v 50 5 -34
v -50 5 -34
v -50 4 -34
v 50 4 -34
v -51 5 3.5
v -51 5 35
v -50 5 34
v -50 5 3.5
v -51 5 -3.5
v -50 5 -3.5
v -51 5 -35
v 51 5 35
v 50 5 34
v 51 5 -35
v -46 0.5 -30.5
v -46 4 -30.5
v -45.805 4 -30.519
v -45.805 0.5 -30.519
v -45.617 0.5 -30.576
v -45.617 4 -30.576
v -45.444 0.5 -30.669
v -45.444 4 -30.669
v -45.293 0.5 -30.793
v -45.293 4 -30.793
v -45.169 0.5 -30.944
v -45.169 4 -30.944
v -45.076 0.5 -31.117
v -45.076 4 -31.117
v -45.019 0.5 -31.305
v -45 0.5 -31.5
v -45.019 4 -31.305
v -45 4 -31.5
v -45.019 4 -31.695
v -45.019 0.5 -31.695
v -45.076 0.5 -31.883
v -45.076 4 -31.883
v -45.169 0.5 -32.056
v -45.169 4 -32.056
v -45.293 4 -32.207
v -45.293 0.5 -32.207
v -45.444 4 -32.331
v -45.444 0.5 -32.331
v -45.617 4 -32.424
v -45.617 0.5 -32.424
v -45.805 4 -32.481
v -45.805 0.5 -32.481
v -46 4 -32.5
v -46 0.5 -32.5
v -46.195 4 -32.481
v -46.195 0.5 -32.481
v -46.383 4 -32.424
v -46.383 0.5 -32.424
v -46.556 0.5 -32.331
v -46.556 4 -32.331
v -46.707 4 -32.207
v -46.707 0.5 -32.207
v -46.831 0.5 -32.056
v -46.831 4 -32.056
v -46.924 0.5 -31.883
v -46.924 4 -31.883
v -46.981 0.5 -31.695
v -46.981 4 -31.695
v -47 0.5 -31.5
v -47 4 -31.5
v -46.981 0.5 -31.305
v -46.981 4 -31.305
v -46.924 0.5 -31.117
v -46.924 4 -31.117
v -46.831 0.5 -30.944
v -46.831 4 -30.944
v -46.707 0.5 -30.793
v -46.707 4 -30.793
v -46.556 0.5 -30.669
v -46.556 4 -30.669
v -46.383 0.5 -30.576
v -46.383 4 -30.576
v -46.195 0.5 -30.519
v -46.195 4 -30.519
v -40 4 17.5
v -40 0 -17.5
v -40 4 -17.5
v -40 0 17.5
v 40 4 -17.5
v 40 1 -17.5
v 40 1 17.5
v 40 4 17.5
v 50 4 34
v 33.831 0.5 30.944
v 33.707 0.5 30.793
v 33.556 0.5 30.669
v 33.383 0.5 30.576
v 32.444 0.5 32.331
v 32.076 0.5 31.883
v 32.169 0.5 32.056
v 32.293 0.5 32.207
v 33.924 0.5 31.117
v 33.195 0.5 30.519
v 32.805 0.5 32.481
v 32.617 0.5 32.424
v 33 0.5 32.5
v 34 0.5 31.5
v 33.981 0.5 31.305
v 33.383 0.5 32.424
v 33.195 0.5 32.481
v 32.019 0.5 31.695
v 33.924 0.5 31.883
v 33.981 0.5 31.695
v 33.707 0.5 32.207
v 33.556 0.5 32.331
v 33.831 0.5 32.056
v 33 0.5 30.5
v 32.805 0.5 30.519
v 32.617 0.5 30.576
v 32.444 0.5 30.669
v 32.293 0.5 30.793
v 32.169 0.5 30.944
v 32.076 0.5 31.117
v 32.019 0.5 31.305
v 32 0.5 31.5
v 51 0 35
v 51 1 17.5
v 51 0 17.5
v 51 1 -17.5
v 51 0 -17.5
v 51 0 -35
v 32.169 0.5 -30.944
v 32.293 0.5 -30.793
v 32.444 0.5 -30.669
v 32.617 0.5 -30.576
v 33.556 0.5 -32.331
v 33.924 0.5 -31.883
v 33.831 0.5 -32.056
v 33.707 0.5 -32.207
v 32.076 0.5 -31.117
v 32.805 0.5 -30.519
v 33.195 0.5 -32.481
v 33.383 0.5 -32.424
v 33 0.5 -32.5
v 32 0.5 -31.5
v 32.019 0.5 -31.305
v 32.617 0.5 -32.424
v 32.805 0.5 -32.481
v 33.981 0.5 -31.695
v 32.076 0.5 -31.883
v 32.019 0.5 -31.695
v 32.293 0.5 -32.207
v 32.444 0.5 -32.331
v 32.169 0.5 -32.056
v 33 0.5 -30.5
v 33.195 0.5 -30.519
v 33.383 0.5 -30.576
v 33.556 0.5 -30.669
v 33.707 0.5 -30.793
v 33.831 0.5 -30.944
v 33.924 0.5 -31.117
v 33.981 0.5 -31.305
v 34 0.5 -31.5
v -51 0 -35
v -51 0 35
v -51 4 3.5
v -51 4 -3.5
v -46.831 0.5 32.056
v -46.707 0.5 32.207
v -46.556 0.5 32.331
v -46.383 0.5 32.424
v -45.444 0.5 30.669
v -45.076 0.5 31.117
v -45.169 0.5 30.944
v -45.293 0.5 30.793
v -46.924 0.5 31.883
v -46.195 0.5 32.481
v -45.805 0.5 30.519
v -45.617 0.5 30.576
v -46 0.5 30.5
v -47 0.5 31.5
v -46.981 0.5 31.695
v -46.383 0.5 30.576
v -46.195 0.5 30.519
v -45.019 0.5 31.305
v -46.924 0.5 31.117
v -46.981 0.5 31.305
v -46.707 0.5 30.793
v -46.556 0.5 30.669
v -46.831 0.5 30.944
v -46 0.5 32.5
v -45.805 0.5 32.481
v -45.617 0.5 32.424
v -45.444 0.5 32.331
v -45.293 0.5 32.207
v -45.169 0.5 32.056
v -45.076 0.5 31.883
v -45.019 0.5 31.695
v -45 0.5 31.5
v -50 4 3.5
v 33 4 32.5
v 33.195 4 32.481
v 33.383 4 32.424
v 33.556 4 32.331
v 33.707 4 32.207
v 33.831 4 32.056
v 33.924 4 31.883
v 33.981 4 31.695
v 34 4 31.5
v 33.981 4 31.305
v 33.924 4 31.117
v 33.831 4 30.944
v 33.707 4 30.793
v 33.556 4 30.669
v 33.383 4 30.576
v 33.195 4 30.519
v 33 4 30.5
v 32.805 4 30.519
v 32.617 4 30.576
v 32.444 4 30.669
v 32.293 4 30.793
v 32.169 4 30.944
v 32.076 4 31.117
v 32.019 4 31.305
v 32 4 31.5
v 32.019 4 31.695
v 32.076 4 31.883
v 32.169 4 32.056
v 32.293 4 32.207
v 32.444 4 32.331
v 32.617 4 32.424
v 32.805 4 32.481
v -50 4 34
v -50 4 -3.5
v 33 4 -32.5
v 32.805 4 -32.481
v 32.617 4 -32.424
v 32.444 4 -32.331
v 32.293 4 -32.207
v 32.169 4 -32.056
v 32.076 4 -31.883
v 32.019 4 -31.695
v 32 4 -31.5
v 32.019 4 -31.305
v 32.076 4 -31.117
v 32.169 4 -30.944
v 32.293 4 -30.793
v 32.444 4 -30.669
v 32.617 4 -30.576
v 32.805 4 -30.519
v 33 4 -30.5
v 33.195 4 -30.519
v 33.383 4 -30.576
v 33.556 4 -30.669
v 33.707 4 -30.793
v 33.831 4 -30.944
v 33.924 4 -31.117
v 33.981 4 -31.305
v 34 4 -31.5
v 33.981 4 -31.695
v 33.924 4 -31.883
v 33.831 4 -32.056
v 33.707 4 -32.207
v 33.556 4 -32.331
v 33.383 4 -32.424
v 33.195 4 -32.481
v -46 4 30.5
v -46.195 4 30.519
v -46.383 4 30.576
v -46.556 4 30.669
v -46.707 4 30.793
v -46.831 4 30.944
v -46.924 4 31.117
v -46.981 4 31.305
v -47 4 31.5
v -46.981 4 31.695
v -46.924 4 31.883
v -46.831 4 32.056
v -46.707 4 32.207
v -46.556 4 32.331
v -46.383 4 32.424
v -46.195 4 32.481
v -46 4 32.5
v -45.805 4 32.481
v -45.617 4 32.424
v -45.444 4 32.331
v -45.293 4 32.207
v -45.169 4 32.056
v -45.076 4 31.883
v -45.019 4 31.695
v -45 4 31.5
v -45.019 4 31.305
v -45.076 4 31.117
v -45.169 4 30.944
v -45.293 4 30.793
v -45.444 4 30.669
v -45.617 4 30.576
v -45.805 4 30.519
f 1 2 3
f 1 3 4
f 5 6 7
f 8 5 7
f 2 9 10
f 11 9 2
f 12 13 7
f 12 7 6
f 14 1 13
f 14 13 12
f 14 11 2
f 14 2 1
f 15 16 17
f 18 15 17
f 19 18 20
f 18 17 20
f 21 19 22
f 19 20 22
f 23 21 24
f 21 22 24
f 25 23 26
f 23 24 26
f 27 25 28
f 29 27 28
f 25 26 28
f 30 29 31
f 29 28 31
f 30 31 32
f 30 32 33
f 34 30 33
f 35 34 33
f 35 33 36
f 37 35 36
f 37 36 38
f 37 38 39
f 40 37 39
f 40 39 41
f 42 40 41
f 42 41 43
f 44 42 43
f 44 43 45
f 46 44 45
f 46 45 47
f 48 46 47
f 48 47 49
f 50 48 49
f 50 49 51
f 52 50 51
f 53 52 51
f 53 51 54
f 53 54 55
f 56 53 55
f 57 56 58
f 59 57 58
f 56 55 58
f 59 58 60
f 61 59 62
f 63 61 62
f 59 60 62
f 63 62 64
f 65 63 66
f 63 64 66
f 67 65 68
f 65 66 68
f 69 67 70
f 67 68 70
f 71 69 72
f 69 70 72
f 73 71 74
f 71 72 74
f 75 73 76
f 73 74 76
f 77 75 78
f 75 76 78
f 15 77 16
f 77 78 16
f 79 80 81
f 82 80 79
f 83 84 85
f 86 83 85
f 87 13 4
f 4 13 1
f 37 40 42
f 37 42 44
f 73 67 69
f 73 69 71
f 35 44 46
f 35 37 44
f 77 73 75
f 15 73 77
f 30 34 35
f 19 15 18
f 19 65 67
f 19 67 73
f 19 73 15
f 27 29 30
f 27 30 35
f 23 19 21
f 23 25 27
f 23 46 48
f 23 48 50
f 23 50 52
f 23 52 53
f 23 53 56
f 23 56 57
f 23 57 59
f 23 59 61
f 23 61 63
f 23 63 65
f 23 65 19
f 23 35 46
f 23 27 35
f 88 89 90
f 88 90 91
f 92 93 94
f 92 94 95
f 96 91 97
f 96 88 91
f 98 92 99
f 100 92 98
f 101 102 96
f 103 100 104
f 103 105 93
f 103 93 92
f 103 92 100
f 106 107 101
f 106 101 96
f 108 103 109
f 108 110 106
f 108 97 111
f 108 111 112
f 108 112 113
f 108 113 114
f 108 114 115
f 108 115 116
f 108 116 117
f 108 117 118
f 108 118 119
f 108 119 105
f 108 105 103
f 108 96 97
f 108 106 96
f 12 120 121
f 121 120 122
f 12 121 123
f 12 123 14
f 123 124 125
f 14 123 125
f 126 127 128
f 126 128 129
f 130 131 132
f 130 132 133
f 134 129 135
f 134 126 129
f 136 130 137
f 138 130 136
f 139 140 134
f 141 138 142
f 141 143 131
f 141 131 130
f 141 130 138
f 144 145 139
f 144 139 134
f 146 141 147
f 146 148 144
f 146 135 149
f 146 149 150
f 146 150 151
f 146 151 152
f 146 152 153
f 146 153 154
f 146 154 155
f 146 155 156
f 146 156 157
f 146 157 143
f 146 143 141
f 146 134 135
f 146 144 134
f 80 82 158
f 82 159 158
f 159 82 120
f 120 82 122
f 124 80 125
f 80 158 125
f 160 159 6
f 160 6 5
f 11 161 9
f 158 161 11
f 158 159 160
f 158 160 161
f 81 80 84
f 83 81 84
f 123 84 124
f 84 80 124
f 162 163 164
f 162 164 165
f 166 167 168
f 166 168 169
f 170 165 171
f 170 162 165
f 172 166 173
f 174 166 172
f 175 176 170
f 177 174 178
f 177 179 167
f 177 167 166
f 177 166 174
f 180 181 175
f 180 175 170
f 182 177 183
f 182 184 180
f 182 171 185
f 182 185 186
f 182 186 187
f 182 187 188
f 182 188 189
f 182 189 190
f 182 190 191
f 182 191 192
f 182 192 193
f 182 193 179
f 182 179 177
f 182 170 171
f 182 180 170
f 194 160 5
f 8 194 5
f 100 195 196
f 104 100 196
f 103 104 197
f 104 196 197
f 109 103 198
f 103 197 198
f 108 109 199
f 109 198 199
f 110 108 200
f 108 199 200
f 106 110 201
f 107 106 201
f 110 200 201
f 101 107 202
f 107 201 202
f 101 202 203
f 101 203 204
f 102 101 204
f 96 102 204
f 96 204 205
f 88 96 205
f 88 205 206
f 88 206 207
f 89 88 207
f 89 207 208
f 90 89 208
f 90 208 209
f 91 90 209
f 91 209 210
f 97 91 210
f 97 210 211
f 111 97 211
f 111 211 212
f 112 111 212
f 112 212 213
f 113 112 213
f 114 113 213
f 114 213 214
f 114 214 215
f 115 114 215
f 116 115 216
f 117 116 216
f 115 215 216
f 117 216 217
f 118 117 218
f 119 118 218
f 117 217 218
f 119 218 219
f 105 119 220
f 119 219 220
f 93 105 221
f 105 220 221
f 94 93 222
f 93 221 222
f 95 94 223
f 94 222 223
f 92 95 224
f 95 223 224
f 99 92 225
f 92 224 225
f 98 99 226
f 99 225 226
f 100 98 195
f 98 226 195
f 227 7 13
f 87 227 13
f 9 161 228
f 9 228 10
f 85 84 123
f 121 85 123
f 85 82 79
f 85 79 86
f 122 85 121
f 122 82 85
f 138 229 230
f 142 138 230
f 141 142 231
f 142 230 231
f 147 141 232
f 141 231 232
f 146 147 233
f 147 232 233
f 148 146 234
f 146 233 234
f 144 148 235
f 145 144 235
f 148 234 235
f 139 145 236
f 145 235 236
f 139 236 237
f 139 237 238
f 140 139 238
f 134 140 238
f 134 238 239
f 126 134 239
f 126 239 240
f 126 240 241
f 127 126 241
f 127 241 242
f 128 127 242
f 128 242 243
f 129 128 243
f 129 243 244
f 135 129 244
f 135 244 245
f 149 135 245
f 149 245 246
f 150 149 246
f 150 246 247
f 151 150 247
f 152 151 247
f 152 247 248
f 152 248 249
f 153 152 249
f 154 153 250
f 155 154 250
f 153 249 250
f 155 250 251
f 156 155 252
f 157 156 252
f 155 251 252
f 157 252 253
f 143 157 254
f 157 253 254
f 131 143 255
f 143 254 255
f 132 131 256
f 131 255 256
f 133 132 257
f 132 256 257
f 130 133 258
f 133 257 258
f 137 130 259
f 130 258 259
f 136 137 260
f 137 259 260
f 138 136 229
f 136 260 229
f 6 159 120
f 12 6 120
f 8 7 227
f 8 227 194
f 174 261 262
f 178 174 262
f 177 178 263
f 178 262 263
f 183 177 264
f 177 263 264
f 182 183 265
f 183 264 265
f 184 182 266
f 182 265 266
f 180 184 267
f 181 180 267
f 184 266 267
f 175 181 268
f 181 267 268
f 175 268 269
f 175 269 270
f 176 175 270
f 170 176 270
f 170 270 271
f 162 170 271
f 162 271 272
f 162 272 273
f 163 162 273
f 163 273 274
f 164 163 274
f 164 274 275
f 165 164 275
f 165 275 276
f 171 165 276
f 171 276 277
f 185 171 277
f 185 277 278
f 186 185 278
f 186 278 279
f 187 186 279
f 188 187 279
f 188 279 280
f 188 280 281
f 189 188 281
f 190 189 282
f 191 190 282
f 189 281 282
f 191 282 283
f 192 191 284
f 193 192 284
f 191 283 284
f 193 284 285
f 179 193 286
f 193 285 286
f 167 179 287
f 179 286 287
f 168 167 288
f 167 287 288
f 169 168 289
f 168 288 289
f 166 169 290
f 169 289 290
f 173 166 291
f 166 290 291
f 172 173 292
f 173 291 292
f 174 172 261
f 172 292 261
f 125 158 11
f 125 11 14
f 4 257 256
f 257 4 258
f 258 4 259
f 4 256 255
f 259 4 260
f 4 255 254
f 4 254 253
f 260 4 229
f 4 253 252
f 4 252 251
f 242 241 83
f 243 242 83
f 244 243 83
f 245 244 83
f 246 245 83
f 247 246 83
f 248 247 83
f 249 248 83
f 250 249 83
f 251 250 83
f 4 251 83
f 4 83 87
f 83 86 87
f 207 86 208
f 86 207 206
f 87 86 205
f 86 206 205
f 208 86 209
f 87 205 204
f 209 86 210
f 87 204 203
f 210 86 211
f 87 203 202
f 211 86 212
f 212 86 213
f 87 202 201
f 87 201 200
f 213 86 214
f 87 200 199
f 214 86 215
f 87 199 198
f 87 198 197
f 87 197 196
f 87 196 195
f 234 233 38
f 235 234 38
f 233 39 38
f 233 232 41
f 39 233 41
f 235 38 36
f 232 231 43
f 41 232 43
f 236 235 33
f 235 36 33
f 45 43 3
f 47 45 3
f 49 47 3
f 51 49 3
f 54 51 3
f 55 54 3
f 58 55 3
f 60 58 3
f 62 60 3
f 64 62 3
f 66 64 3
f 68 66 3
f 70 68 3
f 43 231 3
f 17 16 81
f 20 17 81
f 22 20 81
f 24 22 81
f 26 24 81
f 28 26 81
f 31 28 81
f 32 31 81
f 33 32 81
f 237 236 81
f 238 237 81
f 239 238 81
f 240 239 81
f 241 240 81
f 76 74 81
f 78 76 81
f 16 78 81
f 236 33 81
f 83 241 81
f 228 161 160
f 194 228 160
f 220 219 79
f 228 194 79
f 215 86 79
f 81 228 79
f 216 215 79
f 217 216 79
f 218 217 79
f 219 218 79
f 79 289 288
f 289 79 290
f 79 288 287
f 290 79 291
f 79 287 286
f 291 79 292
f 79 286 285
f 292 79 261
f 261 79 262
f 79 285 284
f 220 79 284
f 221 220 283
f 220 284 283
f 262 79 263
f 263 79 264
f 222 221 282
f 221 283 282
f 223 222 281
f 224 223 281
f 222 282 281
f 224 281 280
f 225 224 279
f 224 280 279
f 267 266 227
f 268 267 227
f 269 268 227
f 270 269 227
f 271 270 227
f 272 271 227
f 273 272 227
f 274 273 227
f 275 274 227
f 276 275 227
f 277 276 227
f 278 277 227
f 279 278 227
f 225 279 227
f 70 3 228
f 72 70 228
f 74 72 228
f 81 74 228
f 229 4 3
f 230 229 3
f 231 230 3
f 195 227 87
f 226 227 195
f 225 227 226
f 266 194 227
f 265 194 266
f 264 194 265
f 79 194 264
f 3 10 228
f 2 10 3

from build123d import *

# Parameters (mm, degrees)
SKETCH_1_W          = 102
SKETCH_1_H          = 70
EXTRUDE_1_DEPTH     = 5
SKETCH_2_R          = 1
CUT_EXTRUDE_1_DEPTH = 4.5
SKETCH_3_W          = 7
SKETCH_3_H          = 1
CUT_EXTRUDE_2_DEPTH = 2
SKETCH_4_W          = 80
SKETCH_4_H          = 35
CUT_EXTRUDE_3_DEPTH = 5
SKETCH_5_W          = 11
SKETCH_5_H          = 35
CUT_EXTRUDE_4_DEPTH = 1
SKETCH_6_W          = 100
SKETCH_6_H          = 68
CUT_EXTRUDE_5_DEPTH = 1


with BuildPart() as part:
    # Эскиз1 → Бобышка-Вытянуть1 (new body)
    with BuildSketch(Plane(origin=(0, 0, 0), x_dir=(1, 0, 0), z_dir=(0, 1, 0))):
        Rectangle(SKETCH_1_W, SKETCH_1_H)
    extrude(amount=EXTRUDE_1_DEPTH)

    # Эскиз2 → Вырез-Вытянуть1 (cut)
    with BuildSketch(Plane(origin=(0, 5, 0), x_dir=(1, 0, 0), z_dir=(0, 1, 0))):
        with Locations(Location((-46, 31.5, 0), (0, 0, 270))):
            Circle(SKETCH_2_R)
        with Locations(Location((33, 31.5, 0), (0, 0, 90))):
            Circle(SKETCH_2_R)
        with Locations(Location((33, -31.5, 0), (0, 0, 270))):
            Circle(SKETCH_2_R)
        with Locations(Location((-46, -31.5, 0), (0, 0, 90))):
            Circle(SKETCH_2_R)
    extrude(amount=-CUT_EXTRUDE_1_DEPTH, mode=Mode.SUBTRACT)

    # Эскиз3 → Вырез-Вытянуть2 (cut)
    with BuildSketch(Plane.ZY.offset(51)):
        with Locations((0, 4.5)):
            Rectangle(SKETCH_3_W, SKETCH_3_H)
    extrude(amount=-CUT_EXTRUDE_2_DEPTH, mode=Mode.SUBTRACT)

    # Эскиз4 → Вырез-Вытянуть3 (cut)
    with BuildSketch(Plane.XZ):
        Rectangle(SKETCH_4_W, SKETCH_4_H)
    extrude(amount=-CUT_EXTRUDE_3_DEPTH, mode=Mode.SUBTRACT)

    # Эскиз5 → Вырез-Вытянуть4 (cut)
    with BuildSketch(Plane.XZ):
        with Locations((45.5, 0)):
            Rectangle(SKETCH_5_W, SKETCH_5_H)
    extrude(amount=-CUT_EXTRUDE_4_DEPTH, mode=Mode.SUBTRACT)

    # Эскиз6 → Вырез-Вытянуть5 (cut)
    with BuildSketch(Plane(origin=(0, 5, 0), x_dir=(1, 0, 0), z_dir=(0, 1, 0))):
        Rectangle(SKETCH_6_W, SKETCH_6_H)
    extrude(amount=-CUT_EXTRUDE_5_DEPTH, mode=Mode.SUBTRACT)


solid = part.part
